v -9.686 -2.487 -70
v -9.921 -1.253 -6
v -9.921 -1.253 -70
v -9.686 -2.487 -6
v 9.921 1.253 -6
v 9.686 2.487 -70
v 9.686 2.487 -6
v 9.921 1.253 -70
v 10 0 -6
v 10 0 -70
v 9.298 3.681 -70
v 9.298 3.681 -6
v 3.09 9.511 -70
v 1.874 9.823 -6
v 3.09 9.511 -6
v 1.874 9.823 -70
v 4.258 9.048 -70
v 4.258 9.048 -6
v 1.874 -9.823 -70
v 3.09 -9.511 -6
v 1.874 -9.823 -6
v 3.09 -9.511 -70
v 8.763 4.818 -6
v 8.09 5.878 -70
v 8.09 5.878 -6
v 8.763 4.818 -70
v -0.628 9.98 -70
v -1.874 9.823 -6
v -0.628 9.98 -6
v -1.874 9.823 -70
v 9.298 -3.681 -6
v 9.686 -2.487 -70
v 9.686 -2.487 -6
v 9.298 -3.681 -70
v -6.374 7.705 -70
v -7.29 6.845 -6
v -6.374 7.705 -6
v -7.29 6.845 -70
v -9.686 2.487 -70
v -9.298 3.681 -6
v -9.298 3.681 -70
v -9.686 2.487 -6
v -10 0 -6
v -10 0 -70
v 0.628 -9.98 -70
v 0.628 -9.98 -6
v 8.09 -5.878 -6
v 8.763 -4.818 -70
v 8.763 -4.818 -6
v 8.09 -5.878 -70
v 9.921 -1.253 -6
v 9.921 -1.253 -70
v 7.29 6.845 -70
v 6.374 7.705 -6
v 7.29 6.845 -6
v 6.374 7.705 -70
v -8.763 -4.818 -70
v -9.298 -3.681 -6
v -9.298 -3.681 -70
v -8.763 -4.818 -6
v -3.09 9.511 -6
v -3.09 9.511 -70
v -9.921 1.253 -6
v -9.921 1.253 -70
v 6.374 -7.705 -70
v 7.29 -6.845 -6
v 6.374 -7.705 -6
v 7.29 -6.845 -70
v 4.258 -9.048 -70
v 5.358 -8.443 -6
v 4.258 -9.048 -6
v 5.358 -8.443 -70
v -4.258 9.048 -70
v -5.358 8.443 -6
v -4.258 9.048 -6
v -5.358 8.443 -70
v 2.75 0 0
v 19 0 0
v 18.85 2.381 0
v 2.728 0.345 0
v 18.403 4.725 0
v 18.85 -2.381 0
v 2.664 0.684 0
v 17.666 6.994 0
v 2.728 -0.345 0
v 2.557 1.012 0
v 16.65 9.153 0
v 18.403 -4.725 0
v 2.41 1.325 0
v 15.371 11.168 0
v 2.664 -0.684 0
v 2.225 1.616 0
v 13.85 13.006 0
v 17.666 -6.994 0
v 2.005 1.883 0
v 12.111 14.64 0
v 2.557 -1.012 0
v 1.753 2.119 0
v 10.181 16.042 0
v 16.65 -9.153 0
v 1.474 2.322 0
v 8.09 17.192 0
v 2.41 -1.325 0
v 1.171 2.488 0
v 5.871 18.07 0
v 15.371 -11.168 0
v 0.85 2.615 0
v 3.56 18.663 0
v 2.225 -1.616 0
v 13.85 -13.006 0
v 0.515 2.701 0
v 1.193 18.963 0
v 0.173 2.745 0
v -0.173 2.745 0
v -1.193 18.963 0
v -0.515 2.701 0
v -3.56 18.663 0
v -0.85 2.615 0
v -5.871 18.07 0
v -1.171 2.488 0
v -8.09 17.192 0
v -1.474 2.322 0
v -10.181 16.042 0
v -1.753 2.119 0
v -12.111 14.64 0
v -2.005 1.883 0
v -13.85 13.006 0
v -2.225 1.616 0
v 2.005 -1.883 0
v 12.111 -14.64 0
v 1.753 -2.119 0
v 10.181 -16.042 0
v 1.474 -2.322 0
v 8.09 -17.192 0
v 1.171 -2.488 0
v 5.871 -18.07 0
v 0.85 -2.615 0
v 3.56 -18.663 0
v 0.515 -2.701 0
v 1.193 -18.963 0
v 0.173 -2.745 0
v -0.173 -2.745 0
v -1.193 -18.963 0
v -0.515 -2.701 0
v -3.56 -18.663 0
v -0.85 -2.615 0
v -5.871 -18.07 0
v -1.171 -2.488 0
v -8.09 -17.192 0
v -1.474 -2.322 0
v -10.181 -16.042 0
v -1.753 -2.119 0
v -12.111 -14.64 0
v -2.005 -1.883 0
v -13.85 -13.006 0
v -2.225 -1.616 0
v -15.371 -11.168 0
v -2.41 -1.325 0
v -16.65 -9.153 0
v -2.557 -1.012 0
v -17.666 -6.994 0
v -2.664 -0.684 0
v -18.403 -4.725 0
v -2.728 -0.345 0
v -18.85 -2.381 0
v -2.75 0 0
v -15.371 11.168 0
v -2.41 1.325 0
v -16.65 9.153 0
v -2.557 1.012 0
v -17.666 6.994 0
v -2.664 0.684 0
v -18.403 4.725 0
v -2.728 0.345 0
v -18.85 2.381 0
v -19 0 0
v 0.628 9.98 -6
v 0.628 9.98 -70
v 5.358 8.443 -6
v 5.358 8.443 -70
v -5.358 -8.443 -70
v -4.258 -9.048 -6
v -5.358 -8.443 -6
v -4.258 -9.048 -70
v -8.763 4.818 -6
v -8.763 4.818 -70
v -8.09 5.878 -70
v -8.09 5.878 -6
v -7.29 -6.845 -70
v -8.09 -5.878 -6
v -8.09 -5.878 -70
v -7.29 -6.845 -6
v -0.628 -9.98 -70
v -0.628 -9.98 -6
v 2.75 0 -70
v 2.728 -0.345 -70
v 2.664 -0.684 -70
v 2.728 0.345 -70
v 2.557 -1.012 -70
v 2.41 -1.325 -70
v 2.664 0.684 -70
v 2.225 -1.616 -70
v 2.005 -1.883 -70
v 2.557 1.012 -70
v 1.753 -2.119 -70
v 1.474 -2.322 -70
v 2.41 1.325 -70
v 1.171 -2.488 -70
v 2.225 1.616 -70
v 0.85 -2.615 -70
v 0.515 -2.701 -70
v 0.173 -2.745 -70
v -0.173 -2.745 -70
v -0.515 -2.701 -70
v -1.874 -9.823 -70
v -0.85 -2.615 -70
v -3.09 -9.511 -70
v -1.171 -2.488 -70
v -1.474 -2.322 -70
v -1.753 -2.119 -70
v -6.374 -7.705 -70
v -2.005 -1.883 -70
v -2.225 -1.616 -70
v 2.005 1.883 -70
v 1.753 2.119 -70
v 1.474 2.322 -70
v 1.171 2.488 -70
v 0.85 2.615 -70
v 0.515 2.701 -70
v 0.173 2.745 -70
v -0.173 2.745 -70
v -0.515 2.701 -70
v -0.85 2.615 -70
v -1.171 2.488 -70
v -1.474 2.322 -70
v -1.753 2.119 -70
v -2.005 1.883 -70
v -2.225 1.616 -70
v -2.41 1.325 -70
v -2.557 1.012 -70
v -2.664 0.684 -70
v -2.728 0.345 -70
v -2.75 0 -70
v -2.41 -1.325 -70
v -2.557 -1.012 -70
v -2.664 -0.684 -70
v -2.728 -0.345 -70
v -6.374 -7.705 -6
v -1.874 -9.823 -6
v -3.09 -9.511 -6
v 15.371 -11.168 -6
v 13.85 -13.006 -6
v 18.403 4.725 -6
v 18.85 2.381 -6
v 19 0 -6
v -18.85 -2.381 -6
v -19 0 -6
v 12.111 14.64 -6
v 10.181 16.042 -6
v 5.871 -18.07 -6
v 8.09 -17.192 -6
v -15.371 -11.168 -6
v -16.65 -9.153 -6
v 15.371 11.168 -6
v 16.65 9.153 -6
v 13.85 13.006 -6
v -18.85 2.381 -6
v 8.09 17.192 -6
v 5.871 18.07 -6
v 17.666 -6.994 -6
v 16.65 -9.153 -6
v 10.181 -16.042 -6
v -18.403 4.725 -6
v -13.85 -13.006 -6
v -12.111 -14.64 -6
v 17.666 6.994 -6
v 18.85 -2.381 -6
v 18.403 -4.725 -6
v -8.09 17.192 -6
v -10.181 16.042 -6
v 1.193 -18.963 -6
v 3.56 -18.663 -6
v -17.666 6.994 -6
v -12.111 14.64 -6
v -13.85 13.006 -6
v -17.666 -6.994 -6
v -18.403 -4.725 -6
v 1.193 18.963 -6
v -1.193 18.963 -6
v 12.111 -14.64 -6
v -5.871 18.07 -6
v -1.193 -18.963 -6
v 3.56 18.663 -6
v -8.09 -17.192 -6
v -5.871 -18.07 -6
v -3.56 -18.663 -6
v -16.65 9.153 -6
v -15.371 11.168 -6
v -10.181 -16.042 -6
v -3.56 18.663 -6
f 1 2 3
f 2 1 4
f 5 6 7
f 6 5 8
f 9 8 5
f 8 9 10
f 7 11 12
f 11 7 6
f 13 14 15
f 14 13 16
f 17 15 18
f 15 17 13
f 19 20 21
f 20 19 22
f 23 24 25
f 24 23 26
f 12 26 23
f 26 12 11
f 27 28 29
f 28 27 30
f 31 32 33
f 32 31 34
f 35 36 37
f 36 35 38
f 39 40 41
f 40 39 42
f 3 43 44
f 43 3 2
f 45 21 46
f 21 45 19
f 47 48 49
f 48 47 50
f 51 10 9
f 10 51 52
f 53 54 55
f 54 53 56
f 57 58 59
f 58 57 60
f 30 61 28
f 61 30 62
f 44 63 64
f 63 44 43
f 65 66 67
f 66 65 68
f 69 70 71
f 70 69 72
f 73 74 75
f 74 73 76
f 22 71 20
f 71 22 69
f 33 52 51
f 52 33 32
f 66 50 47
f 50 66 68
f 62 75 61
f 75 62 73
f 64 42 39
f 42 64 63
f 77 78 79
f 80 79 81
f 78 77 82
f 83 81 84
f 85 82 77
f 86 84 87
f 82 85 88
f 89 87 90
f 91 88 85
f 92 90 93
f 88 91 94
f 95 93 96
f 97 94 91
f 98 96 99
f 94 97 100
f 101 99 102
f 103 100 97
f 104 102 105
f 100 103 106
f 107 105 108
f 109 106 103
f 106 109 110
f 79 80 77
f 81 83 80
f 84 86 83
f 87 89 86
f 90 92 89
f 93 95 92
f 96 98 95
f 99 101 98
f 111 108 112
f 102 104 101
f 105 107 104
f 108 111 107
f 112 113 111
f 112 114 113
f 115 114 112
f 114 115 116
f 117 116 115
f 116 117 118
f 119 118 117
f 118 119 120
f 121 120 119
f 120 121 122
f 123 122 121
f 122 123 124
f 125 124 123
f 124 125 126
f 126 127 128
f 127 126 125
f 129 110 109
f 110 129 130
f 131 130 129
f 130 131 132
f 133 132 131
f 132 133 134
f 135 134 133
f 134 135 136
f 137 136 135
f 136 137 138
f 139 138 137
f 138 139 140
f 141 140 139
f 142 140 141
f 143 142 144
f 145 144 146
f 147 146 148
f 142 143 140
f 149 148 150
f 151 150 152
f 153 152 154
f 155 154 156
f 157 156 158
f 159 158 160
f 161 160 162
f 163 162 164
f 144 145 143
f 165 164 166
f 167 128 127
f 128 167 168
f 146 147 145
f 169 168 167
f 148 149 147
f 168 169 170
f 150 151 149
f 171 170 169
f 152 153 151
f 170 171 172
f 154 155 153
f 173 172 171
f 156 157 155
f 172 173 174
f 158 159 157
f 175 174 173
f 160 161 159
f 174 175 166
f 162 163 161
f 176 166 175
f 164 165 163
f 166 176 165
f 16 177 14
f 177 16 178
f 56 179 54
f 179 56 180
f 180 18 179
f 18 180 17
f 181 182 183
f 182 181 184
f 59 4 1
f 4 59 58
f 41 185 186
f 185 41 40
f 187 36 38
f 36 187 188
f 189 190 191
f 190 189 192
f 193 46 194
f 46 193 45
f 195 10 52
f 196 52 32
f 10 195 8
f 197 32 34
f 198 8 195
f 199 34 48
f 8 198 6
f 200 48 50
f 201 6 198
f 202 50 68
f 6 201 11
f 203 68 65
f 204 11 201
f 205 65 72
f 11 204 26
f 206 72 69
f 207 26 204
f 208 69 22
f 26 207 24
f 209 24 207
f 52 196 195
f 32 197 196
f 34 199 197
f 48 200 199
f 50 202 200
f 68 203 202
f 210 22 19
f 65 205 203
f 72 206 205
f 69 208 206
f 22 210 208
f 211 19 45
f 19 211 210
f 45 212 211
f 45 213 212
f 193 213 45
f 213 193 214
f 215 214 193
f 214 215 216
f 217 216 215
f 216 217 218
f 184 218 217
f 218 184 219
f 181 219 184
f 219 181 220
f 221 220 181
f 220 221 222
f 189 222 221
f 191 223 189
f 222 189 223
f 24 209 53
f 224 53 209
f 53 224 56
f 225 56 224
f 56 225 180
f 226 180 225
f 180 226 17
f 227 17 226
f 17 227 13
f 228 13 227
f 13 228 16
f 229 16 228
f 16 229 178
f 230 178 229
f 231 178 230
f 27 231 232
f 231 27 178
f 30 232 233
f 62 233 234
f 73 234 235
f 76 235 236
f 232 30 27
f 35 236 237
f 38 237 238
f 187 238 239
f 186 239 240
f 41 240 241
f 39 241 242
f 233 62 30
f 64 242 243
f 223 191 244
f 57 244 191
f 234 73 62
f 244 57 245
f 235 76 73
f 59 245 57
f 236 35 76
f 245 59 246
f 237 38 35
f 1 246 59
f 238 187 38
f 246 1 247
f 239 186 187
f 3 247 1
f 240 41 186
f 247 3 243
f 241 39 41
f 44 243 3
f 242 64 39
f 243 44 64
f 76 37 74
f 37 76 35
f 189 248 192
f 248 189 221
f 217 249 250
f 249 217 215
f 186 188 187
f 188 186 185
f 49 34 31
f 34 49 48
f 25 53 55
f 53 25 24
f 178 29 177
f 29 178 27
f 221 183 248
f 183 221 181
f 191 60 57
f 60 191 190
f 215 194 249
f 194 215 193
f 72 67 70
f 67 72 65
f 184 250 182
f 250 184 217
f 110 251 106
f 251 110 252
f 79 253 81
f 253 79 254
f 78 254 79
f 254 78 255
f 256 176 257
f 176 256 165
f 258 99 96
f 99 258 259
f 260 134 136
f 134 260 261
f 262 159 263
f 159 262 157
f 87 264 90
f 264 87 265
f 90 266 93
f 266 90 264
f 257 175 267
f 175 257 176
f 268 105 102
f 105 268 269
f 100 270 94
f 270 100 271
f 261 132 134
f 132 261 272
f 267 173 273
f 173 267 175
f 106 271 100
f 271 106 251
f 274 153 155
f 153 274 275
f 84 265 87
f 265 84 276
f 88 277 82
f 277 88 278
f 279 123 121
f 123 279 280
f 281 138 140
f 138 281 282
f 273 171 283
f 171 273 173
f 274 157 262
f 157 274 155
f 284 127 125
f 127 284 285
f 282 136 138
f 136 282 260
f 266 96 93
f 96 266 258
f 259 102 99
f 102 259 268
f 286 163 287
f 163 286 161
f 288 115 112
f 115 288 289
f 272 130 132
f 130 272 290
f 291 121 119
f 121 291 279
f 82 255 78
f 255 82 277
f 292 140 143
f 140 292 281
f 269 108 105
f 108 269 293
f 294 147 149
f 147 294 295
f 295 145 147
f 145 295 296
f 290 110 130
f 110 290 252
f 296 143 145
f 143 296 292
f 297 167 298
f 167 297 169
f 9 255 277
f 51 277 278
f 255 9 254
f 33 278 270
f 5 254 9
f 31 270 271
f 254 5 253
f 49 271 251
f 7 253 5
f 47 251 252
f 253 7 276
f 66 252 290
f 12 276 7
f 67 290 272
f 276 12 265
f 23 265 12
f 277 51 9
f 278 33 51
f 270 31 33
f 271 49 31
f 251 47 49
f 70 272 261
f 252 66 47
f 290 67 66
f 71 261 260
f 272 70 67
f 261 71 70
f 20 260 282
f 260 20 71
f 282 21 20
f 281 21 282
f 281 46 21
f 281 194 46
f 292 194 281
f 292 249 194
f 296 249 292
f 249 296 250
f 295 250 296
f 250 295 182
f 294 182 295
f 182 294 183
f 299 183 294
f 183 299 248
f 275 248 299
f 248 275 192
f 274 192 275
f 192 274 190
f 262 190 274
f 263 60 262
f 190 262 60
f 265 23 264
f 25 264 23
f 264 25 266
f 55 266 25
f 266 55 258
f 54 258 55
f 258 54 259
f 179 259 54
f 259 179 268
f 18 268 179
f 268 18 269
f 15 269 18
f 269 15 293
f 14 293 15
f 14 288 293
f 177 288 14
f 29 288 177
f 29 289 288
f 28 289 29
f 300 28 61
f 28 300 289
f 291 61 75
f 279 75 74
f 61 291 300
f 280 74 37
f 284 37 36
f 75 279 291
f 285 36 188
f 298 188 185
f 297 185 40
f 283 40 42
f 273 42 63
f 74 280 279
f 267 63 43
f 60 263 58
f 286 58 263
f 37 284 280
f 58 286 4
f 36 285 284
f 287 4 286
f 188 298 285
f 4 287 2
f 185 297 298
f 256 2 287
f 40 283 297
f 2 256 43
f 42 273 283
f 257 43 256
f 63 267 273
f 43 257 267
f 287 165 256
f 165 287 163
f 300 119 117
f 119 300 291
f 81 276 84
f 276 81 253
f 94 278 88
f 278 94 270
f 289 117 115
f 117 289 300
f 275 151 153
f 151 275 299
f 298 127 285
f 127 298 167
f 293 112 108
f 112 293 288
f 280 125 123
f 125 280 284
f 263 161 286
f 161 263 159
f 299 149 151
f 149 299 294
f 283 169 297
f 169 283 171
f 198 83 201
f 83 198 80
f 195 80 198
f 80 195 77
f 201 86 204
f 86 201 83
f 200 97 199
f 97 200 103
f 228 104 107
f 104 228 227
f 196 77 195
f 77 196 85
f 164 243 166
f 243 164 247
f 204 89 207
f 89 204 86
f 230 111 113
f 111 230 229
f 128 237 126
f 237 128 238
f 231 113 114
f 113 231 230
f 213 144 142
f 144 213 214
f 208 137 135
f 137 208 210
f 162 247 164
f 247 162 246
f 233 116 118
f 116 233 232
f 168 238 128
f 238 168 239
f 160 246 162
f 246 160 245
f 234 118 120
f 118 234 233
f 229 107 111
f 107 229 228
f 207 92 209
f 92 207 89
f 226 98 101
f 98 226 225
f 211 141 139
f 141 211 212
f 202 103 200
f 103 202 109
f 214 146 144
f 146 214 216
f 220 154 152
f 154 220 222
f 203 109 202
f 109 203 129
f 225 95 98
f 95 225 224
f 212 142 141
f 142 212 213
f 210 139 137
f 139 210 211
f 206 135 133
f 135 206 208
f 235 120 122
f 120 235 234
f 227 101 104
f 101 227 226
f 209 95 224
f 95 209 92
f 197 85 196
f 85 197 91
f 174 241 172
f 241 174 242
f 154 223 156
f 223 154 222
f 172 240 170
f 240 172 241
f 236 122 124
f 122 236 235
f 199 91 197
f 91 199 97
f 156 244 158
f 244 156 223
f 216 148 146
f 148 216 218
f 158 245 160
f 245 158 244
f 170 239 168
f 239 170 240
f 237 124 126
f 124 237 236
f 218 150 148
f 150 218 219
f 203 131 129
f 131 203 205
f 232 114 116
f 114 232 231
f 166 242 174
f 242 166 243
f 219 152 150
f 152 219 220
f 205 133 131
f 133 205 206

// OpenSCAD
$fn = 50;


difference() {
	union() {
		translate(v = [0, 0, -70.0000000000]) {
			cylinder(h = 70, r = 10.0000000000);
		}
		translate(v = [0, 0, -6.0000000000]) {
			cylinder(h = 6, r = 19.0000000000);
		}
	}
	union() {
		#translate(v = [0, 0, -70]) {
			cylinder(h = 70, r = 2.7500000000);
		}
	}
}
